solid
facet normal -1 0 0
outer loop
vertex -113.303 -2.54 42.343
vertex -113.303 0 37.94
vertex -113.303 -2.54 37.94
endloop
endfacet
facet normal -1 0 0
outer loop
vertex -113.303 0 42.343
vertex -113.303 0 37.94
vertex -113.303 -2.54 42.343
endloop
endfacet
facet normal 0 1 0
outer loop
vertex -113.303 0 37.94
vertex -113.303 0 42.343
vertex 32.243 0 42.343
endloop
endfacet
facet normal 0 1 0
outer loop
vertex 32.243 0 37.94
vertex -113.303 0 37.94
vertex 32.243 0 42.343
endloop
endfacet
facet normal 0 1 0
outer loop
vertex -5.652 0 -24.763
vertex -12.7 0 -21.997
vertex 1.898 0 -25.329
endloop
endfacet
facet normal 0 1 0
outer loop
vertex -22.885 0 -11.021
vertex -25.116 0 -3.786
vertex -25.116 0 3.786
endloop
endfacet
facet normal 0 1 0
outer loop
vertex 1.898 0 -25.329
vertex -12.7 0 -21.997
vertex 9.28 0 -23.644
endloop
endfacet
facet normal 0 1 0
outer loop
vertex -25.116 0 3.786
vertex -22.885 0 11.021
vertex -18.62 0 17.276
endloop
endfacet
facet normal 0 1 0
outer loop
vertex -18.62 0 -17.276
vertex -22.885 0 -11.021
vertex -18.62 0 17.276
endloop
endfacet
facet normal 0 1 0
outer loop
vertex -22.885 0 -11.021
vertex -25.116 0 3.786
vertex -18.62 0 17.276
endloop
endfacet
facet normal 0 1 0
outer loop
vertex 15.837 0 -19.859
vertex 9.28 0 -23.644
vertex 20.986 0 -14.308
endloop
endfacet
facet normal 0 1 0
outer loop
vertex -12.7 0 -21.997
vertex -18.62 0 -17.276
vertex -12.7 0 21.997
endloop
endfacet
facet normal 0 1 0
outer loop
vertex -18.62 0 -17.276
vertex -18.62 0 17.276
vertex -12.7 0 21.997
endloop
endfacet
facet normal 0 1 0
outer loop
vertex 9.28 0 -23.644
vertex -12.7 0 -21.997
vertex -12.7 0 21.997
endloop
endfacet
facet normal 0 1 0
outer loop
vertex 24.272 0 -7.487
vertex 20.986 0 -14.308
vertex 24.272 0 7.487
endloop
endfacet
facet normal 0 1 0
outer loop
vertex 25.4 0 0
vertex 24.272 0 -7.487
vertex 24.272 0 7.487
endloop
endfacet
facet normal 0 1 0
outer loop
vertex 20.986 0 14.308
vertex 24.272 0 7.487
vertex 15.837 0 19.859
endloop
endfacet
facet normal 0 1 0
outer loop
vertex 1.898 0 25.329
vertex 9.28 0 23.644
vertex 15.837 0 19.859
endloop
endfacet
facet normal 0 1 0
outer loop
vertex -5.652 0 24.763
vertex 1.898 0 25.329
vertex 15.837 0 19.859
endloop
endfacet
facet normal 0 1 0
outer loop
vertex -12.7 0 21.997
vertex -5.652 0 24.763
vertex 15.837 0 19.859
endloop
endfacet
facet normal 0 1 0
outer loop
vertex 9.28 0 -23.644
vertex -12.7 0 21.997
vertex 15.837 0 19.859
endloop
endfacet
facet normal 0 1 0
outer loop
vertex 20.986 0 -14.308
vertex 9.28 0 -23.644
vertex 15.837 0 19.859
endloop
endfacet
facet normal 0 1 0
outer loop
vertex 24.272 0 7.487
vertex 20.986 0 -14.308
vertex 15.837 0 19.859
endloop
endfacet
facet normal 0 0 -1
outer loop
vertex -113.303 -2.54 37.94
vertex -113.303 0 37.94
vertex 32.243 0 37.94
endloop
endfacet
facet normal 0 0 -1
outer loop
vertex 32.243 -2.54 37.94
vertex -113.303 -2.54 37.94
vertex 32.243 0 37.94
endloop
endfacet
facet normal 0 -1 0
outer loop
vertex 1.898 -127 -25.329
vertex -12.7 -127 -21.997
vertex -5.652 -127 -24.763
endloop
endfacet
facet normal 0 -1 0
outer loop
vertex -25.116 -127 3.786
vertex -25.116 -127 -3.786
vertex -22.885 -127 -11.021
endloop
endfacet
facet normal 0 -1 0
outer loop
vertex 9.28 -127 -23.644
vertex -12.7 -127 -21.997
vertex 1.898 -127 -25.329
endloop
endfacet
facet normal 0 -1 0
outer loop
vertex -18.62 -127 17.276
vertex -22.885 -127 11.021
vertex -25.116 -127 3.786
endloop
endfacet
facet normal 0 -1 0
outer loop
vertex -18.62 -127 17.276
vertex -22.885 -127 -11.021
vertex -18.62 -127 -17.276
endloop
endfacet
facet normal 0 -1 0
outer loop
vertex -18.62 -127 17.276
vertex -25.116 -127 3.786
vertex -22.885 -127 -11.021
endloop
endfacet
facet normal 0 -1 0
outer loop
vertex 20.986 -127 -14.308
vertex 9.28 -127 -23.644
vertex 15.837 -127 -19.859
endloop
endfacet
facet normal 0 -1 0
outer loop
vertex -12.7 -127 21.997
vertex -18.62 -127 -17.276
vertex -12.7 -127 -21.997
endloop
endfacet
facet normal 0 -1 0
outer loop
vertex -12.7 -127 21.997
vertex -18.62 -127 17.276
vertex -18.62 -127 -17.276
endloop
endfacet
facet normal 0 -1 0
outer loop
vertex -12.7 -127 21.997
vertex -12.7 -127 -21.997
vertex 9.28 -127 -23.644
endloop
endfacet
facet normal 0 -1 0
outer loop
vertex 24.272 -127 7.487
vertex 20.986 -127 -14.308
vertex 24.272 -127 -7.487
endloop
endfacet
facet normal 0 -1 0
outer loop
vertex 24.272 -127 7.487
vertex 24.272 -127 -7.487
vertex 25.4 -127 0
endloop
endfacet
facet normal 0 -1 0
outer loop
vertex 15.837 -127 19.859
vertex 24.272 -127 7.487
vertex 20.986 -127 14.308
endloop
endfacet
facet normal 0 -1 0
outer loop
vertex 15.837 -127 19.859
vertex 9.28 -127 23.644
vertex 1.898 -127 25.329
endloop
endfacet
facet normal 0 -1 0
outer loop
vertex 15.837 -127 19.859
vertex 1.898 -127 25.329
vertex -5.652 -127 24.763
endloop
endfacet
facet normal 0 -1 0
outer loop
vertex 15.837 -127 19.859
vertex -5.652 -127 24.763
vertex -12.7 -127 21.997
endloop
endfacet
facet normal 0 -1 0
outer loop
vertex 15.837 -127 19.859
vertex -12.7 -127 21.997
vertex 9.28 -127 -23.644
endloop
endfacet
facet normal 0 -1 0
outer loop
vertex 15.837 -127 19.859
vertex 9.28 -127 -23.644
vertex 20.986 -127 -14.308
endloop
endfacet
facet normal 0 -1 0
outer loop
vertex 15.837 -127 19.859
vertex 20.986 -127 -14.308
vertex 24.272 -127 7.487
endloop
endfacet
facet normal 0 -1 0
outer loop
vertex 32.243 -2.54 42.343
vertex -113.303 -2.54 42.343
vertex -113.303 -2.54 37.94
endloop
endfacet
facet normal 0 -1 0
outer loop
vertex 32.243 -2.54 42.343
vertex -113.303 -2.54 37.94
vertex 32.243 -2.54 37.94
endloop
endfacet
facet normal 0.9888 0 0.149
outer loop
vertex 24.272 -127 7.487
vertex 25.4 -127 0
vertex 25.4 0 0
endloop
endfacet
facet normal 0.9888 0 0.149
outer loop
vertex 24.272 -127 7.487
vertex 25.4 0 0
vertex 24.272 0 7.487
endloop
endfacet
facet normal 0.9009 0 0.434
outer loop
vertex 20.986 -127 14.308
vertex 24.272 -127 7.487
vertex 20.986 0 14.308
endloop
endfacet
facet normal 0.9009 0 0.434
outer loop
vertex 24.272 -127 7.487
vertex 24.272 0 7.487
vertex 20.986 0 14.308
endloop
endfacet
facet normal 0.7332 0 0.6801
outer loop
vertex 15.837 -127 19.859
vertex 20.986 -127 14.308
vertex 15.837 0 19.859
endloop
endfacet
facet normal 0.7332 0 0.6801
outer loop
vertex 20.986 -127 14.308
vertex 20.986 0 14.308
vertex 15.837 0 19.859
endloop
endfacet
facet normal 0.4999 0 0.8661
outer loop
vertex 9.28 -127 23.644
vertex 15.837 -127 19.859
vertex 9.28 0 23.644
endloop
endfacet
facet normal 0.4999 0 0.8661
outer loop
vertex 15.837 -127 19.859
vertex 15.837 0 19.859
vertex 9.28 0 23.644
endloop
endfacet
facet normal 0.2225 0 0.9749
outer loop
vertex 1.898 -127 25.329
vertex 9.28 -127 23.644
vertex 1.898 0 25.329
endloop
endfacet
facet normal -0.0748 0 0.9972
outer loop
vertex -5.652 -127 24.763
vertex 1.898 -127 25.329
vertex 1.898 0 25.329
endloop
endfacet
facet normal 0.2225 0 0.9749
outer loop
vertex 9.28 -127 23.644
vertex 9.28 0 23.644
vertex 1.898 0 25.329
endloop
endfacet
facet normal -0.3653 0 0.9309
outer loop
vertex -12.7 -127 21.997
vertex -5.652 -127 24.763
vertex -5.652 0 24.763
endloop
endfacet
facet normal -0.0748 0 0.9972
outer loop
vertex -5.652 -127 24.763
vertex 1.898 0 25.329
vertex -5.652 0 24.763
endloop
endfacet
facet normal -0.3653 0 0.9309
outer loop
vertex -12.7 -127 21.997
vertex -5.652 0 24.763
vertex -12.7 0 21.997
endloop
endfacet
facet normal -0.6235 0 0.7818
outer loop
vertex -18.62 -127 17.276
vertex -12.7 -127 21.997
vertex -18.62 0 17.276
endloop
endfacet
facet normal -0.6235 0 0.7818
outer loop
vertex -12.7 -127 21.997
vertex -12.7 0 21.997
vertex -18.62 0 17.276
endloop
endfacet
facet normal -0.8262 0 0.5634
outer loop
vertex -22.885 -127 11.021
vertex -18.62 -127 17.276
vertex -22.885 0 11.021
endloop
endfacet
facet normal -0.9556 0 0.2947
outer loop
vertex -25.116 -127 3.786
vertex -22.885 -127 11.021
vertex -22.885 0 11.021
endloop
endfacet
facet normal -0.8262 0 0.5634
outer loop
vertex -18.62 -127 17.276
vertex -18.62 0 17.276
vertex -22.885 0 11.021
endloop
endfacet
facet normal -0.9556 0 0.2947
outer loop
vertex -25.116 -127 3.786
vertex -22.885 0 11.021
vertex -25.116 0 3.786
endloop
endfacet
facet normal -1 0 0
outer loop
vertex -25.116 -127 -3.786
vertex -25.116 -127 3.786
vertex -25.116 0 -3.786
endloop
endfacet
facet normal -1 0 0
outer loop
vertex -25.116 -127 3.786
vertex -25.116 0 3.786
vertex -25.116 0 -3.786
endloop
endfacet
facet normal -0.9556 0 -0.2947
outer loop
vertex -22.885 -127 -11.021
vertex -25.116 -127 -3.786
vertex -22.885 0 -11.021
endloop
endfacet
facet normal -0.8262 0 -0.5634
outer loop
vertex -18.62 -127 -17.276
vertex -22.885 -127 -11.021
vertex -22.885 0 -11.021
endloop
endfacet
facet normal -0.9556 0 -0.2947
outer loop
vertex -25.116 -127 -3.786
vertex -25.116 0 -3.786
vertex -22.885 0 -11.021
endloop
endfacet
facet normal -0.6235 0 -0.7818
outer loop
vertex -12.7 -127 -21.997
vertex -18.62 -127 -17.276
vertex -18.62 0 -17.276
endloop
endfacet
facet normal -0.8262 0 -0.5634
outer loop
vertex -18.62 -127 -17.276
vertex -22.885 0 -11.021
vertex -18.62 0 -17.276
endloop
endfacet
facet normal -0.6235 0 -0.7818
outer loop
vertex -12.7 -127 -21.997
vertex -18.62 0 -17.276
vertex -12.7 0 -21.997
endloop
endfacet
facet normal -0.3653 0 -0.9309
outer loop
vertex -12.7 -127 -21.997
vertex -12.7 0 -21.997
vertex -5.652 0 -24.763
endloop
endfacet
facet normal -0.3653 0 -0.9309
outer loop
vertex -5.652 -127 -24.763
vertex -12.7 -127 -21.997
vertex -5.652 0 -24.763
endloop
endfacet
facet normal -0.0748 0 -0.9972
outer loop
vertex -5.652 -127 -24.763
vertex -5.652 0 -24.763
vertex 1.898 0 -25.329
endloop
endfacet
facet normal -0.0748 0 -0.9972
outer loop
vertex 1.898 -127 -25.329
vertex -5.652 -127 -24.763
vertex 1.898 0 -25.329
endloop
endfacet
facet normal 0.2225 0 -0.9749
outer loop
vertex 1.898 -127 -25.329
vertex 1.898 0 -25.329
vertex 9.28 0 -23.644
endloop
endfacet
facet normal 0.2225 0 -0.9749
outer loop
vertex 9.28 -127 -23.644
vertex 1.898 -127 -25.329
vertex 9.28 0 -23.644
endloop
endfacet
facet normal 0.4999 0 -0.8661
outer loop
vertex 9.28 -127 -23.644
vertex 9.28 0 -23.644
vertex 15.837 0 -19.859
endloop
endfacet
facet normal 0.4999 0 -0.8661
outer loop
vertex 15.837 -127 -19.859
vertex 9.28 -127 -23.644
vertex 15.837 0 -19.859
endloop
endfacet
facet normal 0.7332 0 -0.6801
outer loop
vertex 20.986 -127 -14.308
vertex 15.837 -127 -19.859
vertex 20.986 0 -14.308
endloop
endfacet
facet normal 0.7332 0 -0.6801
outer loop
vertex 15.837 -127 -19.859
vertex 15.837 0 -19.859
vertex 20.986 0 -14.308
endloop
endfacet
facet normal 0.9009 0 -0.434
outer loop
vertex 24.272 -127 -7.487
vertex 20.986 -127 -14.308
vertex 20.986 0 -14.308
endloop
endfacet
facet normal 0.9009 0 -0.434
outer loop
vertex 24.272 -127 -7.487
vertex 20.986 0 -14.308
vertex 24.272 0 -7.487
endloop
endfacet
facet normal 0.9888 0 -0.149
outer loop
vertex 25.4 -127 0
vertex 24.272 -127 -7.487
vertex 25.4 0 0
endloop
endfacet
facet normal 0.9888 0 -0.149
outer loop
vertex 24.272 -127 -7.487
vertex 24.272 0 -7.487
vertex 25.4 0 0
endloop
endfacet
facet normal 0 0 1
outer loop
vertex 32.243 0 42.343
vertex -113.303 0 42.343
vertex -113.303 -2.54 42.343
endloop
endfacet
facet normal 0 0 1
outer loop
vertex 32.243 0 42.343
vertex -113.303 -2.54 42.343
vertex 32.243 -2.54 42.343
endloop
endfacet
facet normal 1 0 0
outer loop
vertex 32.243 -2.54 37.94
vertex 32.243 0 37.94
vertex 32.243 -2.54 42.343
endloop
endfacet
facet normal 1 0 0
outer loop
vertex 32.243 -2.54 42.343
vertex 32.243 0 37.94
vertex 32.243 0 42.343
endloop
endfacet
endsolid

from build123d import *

# Parameters (mm, degrees)
F0_W     = 145.545721
F0_H     = 4.402627
F1_DEPTH = 2.54
F0_R     = 25.4
F2_DEPTH = 127


with BuildPart() as f1:
    # F0 (on Front) → F1 (new body)
    with BuildSketch(Plane.XZ):
        with Locations((-40.53008, 40.141613)):
            Rectangle(F0_W, F0_H)
    extrude(amount=F1_DEPTH)


with BuildPart() as f2:
    # F0 (on Front) → F2 (new body)
    with BuildSketch(Plane.XZ):
        Circle(F0_R)
    extrude(amount=F2_DEPTH)


solid = Compound([f1.part, f2.part])
